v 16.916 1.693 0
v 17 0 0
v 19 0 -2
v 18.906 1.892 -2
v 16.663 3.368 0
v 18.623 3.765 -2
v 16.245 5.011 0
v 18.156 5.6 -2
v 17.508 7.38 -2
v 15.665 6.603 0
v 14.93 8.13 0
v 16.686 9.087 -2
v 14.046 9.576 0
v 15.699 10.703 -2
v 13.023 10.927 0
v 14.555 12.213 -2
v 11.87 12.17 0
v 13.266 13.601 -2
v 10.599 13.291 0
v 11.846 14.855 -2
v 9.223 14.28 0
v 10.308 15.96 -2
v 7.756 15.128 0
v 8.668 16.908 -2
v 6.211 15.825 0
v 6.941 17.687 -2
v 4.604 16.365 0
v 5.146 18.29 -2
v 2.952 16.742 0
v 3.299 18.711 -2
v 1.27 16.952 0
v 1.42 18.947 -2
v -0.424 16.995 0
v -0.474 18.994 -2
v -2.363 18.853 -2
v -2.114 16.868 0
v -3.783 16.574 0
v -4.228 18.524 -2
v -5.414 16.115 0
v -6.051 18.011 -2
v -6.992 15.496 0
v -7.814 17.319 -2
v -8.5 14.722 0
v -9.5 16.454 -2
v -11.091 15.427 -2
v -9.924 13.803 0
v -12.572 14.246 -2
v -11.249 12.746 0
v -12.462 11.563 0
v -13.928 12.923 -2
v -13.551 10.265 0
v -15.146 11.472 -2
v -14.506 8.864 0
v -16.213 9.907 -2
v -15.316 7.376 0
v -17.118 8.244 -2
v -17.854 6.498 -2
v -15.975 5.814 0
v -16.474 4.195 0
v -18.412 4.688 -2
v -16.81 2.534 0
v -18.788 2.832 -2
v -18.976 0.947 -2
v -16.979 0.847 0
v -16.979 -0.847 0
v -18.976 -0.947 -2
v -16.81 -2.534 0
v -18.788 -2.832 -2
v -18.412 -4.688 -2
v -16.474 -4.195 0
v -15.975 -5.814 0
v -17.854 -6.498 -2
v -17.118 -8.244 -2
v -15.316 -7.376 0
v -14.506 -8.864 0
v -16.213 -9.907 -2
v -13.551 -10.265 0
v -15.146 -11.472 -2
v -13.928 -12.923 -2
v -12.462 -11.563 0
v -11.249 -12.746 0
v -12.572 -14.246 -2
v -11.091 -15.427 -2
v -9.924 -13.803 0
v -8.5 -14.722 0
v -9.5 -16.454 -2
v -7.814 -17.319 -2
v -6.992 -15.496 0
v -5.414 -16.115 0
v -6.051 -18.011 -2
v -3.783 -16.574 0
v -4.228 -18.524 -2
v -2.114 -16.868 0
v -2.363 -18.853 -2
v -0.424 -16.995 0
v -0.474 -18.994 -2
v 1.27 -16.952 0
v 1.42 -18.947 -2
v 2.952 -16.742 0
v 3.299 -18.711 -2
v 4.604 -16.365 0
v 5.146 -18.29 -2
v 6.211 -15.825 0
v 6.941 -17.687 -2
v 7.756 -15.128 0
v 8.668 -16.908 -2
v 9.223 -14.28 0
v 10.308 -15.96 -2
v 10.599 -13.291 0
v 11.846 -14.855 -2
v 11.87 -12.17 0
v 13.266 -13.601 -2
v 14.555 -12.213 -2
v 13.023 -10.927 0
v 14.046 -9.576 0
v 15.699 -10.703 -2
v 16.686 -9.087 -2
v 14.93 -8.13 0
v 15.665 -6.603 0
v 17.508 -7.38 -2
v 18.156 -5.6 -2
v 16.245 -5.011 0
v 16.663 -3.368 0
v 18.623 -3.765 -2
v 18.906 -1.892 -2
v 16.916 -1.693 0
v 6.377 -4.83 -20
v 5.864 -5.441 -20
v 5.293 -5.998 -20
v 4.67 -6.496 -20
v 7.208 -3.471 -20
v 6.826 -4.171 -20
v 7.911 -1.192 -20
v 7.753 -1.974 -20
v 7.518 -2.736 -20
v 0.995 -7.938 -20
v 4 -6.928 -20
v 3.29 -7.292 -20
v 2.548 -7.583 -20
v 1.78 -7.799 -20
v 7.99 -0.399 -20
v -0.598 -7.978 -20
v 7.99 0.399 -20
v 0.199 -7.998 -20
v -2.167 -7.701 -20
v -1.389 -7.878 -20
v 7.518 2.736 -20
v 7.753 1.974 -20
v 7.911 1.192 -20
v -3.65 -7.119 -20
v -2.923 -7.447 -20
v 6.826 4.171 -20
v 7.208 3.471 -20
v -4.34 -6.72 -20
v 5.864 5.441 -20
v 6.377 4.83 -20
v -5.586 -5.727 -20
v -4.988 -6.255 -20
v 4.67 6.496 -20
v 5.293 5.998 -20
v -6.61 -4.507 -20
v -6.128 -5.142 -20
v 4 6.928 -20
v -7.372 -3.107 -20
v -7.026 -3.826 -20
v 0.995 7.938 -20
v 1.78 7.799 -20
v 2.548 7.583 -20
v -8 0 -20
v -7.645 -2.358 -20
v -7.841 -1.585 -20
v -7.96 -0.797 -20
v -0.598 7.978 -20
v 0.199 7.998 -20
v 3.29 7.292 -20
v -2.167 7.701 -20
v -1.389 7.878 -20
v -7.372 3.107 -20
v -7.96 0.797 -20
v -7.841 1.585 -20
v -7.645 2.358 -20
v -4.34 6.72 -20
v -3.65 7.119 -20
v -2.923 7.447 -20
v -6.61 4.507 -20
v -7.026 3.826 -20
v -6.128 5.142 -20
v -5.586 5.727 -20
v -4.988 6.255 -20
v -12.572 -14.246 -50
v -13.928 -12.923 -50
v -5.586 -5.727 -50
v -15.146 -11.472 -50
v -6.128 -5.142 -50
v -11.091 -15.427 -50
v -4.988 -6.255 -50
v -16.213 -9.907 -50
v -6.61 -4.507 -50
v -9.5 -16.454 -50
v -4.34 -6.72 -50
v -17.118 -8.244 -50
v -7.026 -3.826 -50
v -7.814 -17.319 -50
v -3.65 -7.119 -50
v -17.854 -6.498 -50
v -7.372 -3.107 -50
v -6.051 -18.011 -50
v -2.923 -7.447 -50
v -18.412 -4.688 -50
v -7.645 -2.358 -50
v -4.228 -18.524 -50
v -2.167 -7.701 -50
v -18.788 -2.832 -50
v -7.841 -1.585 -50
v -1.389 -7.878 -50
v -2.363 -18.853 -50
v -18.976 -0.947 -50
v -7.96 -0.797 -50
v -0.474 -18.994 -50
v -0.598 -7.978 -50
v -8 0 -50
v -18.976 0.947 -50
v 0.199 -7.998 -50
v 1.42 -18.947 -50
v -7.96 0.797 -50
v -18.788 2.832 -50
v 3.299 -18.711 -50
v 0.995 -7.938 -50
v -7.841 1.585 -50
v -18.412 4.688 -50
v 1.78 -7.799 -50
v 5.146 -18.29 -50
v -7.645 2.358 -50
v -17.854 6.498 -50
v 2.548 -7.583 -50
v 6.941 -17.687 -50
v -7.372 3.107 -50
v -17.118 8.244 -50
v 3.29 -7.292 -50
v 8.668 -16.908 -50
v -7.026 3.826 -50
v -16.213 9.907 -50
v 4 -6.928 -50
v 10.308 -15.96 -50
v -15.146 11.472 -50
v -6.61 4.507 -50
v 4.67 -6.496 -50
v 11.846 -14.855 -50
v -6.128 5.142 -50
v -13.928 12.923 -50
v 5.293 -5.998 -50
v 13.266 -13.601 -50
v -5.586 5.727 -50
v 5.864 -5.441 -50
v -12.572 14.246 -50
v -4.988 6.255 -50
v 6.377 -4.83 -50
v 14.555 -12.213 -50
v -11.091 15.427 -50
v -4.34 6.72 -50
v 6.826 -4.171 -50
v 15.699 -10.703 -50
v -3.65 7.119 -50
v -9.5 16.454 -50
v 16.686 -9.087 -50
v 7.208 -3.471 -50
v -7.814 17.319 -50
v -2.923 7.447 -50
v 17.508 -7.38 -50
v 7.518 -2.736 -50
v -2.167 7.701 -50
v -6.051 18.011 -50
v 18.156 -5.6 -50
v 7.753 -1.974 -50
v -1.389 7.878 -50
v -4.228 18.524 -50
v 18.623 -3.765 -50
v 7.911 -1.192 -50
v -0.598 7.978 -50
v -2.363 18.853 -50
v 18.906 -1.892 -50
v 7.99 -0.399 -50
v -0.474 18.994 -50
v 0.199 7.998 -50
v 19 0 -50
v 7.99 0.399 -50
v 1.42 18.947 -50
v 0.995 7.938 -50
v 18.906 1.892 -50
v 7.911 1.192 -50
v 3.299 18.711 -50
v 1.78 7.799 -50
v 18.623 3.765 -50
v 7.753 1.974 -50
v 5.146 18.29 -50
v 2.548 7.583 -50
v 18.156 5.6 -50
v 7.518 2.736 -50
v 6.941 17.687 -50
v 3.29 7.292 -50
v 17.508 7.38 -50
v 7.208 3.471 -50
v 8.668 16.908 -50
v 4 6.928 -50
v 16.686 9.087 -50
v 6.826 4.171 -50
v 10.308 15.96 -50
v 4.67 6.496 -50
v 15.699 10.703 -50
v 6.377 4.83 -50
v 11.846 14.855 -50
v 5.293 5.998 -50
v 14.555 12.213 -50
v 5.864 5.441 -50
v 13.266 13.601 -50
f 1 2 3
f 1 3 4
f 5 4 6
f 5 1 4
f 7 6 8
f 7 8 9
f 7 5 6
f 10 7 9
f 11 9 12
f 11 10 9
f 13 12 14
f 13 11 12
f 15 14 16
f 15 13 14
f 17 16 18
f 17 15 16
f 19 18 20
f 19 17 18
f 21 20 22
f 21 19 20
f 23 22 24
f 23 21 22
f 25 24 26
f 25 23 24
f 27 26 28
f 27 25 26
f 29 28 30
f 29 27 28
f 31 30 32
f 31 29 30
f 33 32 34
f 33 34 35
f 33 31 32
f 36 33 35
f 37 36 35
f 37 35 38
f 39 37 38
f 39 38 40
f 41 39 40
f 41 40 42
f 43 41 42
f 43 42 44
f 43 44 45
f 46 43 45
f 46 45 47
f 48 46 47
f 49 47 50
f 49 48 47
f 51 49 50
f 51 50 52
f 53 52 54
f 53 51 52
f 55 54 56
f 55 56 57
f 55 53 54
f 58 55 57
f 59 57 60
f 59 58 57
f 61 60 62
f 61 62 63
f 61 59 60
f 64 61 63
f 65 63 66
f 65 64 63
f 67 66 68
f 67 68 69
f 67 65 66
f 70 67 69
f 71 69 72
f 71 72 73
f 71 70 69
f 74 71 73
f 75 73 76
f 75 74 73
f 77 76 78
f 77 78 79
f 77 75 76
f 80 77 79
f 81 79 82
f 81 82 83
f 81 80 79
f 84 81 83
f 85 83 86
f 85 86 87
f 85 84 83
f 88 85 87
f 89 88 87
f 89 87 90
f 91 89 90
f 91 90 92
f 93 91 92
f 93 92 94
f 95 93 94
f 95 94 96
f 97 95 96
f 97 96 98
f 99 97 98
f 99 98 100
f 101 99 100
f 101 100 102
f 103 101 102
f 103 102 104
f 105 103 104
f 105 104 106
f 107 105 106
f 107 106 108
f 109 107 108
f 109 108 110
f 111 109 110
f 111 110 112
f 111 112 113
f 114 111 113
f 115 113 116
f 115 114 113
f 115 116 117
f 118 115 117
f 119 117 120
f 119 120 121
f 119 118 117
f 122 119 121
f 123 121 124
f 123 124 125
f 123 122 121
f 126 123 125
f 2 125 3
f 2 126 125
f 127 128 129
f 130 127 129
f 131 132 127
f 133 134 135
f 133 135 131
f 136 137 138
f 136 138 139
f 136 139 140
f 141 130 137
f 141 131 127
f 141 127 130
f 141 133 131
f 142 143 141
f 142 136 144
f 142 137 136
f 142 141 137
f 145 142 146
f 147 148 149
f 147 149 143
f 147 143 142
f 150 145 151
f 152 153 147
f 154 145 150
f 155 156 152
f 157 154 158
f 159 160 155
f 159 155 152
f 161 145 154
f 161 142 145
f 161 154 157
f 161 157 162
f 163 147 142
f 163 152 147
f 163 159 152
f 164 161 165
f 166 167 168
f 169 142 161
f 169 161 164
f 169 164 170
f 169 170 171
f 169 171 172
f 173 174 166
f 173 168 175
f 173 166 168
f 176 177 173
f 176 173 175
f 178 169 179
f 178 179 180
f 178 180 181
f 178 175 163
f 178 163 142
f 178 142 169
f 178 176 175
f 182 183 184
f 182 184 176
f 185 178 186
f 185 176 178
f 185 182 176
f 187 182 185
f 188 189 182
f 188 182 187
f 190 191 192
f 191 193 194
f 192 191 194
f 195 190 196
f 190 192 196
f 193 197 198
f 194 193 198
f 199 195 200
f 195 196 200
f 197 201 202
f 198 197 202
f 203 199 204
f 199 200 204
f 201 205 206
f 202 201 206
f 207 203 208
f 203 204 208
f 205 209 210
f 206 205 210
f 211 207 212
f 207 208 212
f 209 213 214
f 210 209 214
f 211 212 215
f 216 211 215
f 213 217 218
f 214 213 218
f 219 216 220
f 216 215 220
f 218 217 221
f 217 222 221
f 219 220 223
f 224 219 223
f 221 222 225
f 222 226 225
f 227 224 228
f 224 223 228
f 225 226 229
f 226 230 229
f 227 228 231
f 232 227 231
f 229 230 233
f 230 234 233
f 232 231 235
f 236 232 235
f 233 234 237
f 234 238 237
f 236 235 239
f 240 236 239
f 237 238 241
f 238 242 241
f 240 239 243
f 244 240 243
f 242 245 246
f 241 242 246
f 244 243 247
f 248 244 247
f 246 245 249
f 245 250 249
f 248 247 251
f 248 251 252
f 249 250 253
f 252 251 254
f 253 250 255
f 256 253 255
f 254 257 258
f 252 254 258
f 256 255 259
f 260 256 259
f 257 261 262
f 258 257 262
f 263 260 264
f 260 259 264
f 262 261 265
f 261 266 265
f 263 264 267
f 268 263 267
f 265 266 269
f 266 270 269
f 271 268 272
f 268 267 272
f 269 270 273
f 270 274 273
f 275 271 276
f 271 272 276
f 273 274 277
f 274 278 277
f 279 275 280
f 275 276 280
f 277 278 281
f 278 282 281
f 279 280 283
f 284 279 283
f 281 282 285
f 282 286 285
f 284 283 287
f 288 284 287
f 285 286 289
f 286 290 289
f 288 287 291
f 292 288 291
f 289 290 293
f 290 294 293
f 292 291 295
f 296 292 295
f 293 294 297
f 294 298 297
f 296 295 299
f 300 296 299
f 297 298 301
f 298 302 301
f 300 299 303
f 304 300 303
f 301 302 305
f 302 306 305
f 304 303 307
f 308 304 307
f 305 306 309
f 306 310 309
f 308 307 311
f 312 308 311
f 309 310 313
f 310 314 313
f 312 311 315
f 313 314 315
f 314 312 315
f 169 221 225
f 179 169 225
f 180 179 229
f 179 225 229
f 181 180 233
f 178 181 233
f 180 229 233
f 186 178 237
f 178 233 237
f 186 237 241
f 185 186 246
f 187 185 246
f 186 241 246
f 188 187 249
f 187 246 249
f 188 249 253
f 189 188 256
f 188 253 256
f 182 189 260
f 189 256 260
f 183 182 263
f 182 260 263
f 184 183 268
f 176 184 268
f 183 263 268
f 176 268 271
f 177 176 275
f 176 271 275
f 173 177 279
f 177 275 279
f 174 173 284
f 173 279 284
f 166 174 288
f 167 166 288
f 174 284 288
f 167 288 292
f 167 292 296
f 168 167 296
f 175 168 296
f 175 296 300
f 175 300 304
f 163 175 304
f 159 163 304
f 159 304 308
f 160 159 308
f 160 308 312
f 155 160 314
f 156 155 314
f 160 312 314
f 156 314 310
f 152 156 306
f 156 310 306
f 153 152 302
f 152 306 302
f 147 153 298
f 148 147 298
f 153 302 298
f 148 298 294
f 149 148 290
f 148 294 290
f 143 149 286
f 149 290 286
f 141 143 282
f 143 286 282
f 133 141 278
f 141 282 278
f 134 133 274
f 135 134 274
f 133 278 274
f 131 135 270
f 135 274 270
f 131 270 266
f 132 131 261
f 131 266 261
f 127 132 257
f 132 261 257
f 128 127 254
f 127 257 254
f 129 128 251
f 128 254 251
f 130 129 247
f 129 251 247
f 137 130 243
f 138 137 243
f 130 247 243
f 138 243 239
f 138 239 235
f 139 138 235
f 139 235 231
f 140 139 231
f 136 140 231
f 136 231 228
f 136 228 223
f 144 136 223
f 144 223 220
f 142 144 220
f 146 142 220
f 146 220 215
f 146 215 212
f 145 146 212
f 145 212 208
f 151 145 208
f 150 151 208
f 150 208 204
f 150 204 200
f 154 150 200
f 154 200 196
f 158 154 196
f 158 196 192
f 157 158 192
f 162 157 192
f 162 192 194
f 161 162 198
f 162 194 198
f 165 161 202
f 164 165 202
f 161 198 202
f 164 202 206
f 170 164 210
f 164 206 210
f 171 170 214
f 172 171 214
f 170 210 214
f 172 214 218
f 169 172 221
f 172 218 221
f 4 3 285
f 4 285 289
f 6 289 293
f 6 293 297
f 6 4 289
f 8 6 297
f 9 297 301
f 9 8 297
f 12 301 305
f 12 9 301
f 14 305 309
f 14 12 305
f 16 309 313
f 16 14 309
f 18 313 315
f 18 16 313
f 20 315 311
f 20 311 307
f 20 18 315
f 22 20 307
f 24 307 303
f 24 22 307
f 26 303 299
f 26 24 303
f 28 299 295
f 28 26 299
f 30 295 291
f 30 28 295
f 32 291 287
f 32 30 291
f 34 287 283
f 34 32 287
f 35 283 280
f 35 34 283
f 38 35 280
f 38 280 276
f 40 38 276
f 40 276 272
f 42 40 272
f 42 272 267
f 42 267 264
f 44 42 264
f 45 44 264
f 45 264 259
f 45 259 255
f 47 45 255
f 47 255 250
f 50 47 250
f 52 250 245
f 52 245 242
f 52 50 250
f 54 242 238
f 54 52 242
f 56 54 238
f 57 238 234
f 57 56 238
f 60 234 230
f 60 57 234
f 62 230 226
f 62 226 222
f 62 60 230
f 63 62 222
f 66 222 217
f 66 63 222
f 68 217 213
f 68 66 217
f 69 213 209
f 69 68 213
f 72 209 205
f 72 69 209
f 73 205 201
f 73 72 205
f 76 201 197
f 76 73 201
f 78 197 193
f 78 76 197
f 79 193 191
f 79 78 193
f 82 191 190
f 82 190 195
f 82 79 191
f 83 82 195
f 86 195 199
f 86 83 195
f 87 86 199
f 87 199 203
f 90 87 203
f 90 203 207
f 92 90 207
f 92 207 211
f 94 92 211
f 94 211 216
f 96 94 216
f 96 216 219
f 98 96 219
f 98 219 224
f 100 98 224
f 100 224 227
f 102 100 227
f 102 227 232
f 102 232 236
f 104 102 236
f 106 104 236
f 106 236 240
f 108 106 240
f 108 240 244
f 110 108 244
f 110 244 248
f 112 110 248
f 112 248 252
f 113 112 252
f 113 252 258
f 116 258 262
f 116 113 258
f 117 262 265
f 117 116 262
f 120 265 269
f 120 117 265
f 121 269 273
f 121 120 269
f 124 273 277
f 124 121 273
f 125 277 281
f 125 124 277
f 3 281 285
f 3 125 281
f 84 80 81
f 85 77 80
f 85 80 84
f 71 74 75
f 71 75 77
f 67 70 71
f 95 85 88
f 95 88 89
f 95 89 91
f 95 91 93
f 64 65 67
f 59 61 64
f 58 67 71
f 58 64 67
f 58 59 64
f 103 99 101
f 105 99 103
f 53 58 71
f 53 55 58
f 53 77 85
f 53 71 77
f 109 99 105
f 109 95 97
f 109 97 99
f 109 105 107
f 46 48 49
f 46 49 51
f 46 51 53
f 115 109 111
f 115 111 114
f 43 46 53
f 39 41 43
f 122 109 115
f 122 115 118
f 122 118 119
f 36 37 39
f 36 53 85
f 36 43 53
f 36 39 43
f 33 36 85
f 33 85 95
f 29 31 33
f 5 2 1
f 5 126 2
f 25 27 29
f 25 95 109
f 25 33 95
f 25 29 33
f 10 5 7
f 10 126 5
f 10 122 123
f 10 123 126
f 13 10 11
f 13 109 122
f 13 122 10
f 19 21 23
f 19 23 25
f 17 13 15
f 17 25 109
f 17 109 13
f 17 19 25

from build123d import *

# Parameters (mm, degrees)
CROQUIS1_R              = 19
SALIENTE_EXTRUIR1_DEPTH = 50
CHAFL_N1_SIZE           = 2
CROQUIS2_R              = 8
CORTAR_EXTRUIR1_DEPTH   = 30


with BuildPart() as part:
    # Croquis1 → Saliente-Extruir1 (new body)
    with BuildSketch(Plane.XY):
        Circle(CROQUIS1_R)
    extrude(amount=-SALIENTE_EXTRUIR1_DEPTH)

    # Chaflán1
    chafl_n1_edges = [part.edges().sort_by_distance(p)[0] for p in [
        (-19, 0, 0),
    ]]
    chamfer(chafl_n1_edges, length=CHAFL_N1_SIZE)

    # Croquis2 → Cortar-Extruir1 (cut)
    with BuildSketch(Plane(origin=(0, 0, -50), x_dir=(-1, 0, 0), z_dir=(0, 0, -1))):
        Circle(CROQUIS2_R)
    extrude(amount=-CORTAR_EXTRUIR1_DEPTH, mode=Mode.SUBTRACT)


solid = part.part
